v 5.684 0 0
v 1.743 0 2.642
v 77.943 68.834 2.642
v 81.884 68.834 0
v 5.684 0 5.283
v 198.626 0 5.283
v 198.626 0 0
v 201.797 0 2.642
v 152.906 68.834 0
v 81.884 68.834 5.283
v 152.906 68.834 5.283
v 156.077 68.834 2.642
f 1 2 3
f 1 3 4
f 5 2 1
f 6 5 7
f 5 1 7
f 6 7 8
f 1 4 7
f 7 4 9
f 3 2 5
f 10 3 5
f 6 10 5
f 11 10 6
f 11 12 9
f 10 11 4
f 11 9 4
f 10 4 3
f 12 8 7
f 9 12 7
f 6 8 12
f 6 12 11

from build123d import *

# Parameters (mm, degrees)
BOSS_EXTRUDE1_DEPTH = 5.2832
CHAMFER1_SIZE       = 3.81


with BuildPart() as part:
    # Sketch1 → Boss-Extrude1 (new body)
    with BuildSketch(Plane.XY):
        Polygon((0, 0), (203.2, 0), (157.48, 68.834), (76.2, 68.834), align=None)
    extrude(amount=BOSS_EXTRUDE1_DEPTH)

    # Chamfer1
    # the kernel refuses this chamfer: 3.81 mm, written as the material it takes off along each edge
    with BuildSketch(Plane(origin=(208.621106578, -8.161777125, 5.2832), x_dir=(0.022903923995424024, 0.015212938447145094, -0.9996219169112966), z_dir=(-0.5532807214186398, 0.8329948639136195, 0))) as chamfer1_piece_1:
        Polygon((CHAMFER1_SIZE * 0.999621916911, CHAMFER1_SIZE * 0.0274958766106), (-CHAMFER1_SIZE * 0.0274958766106, CHAMFER1_SIZE * 0.999621916911), (0, 0), align=None)
    extrude(amount=102.230587414, mode=Mode.SUBTRACT)
    with BuildSketch(Plane(origin=(208.621106578, -8.161777125, 0), x_dir=(0.022903923995424024, 0.015212938447145094, 0.9996219169112966), z_dir=(-0.5532807214186398, 0.8329948639136195, 0))) as chamfer1_piece_2:
        Polygon((CHAMFER1_SIZE * 0.999621916911, -CHAMFER1_SIZE * 0.0274958766106), (-CHAMFER1_SIZE * 0.0274958766106, -CHAMFER1_SIZE * 0.999621916911), (0, 0), align=None)
    extrude(amount=102.230587414, mode=Mode.SUBTRACT)
    with BuildSketch(Plane(origin=(83.470816045, 75.401970494, 5.2832), x_dir=(-0.01843131645089907, 0.020403671347858754, -0.9996219169112968), z_dir=(-0.7420629513591385, -0.6703301993944216, 0))) as chamfer1_piece_3:
        Polygon((CHAMFER1_SIZE * 0.999621916911, CHAMFER1_SIZE * 0.0274958766106), (-CHAMFER1_SIZE * 0.0274958766106, CHAMFER1_SIZE * 0.999621916911), (0, 0), align=None)
    extrude(amount=122.282930207, mode=Mode.SUBTRACT)
    with BuildSketch(Plane(origin=(83.470816045, 75.401970494, 0), x_dir=(-0.01843131645089907, 0.020403671347858754, 0.9996219169112968), z_dir=(-0.7420629513591385, -0.6703301993944216, 0))) as chamfer1_piece_4:
        Polygon((CHAMFER1_SIZE * 0.999621916911, -CHAMFER1_SIZE * 0.0274958766106), (-CHAMFER1_SIZE * 0.0274958766106, -CHAMFER1_SIZE * 0.999621916911), (0, 0), align=None)
    extrude(amount=122.282930207, mode=Mode.SUBTRACT)


solid = part.part
